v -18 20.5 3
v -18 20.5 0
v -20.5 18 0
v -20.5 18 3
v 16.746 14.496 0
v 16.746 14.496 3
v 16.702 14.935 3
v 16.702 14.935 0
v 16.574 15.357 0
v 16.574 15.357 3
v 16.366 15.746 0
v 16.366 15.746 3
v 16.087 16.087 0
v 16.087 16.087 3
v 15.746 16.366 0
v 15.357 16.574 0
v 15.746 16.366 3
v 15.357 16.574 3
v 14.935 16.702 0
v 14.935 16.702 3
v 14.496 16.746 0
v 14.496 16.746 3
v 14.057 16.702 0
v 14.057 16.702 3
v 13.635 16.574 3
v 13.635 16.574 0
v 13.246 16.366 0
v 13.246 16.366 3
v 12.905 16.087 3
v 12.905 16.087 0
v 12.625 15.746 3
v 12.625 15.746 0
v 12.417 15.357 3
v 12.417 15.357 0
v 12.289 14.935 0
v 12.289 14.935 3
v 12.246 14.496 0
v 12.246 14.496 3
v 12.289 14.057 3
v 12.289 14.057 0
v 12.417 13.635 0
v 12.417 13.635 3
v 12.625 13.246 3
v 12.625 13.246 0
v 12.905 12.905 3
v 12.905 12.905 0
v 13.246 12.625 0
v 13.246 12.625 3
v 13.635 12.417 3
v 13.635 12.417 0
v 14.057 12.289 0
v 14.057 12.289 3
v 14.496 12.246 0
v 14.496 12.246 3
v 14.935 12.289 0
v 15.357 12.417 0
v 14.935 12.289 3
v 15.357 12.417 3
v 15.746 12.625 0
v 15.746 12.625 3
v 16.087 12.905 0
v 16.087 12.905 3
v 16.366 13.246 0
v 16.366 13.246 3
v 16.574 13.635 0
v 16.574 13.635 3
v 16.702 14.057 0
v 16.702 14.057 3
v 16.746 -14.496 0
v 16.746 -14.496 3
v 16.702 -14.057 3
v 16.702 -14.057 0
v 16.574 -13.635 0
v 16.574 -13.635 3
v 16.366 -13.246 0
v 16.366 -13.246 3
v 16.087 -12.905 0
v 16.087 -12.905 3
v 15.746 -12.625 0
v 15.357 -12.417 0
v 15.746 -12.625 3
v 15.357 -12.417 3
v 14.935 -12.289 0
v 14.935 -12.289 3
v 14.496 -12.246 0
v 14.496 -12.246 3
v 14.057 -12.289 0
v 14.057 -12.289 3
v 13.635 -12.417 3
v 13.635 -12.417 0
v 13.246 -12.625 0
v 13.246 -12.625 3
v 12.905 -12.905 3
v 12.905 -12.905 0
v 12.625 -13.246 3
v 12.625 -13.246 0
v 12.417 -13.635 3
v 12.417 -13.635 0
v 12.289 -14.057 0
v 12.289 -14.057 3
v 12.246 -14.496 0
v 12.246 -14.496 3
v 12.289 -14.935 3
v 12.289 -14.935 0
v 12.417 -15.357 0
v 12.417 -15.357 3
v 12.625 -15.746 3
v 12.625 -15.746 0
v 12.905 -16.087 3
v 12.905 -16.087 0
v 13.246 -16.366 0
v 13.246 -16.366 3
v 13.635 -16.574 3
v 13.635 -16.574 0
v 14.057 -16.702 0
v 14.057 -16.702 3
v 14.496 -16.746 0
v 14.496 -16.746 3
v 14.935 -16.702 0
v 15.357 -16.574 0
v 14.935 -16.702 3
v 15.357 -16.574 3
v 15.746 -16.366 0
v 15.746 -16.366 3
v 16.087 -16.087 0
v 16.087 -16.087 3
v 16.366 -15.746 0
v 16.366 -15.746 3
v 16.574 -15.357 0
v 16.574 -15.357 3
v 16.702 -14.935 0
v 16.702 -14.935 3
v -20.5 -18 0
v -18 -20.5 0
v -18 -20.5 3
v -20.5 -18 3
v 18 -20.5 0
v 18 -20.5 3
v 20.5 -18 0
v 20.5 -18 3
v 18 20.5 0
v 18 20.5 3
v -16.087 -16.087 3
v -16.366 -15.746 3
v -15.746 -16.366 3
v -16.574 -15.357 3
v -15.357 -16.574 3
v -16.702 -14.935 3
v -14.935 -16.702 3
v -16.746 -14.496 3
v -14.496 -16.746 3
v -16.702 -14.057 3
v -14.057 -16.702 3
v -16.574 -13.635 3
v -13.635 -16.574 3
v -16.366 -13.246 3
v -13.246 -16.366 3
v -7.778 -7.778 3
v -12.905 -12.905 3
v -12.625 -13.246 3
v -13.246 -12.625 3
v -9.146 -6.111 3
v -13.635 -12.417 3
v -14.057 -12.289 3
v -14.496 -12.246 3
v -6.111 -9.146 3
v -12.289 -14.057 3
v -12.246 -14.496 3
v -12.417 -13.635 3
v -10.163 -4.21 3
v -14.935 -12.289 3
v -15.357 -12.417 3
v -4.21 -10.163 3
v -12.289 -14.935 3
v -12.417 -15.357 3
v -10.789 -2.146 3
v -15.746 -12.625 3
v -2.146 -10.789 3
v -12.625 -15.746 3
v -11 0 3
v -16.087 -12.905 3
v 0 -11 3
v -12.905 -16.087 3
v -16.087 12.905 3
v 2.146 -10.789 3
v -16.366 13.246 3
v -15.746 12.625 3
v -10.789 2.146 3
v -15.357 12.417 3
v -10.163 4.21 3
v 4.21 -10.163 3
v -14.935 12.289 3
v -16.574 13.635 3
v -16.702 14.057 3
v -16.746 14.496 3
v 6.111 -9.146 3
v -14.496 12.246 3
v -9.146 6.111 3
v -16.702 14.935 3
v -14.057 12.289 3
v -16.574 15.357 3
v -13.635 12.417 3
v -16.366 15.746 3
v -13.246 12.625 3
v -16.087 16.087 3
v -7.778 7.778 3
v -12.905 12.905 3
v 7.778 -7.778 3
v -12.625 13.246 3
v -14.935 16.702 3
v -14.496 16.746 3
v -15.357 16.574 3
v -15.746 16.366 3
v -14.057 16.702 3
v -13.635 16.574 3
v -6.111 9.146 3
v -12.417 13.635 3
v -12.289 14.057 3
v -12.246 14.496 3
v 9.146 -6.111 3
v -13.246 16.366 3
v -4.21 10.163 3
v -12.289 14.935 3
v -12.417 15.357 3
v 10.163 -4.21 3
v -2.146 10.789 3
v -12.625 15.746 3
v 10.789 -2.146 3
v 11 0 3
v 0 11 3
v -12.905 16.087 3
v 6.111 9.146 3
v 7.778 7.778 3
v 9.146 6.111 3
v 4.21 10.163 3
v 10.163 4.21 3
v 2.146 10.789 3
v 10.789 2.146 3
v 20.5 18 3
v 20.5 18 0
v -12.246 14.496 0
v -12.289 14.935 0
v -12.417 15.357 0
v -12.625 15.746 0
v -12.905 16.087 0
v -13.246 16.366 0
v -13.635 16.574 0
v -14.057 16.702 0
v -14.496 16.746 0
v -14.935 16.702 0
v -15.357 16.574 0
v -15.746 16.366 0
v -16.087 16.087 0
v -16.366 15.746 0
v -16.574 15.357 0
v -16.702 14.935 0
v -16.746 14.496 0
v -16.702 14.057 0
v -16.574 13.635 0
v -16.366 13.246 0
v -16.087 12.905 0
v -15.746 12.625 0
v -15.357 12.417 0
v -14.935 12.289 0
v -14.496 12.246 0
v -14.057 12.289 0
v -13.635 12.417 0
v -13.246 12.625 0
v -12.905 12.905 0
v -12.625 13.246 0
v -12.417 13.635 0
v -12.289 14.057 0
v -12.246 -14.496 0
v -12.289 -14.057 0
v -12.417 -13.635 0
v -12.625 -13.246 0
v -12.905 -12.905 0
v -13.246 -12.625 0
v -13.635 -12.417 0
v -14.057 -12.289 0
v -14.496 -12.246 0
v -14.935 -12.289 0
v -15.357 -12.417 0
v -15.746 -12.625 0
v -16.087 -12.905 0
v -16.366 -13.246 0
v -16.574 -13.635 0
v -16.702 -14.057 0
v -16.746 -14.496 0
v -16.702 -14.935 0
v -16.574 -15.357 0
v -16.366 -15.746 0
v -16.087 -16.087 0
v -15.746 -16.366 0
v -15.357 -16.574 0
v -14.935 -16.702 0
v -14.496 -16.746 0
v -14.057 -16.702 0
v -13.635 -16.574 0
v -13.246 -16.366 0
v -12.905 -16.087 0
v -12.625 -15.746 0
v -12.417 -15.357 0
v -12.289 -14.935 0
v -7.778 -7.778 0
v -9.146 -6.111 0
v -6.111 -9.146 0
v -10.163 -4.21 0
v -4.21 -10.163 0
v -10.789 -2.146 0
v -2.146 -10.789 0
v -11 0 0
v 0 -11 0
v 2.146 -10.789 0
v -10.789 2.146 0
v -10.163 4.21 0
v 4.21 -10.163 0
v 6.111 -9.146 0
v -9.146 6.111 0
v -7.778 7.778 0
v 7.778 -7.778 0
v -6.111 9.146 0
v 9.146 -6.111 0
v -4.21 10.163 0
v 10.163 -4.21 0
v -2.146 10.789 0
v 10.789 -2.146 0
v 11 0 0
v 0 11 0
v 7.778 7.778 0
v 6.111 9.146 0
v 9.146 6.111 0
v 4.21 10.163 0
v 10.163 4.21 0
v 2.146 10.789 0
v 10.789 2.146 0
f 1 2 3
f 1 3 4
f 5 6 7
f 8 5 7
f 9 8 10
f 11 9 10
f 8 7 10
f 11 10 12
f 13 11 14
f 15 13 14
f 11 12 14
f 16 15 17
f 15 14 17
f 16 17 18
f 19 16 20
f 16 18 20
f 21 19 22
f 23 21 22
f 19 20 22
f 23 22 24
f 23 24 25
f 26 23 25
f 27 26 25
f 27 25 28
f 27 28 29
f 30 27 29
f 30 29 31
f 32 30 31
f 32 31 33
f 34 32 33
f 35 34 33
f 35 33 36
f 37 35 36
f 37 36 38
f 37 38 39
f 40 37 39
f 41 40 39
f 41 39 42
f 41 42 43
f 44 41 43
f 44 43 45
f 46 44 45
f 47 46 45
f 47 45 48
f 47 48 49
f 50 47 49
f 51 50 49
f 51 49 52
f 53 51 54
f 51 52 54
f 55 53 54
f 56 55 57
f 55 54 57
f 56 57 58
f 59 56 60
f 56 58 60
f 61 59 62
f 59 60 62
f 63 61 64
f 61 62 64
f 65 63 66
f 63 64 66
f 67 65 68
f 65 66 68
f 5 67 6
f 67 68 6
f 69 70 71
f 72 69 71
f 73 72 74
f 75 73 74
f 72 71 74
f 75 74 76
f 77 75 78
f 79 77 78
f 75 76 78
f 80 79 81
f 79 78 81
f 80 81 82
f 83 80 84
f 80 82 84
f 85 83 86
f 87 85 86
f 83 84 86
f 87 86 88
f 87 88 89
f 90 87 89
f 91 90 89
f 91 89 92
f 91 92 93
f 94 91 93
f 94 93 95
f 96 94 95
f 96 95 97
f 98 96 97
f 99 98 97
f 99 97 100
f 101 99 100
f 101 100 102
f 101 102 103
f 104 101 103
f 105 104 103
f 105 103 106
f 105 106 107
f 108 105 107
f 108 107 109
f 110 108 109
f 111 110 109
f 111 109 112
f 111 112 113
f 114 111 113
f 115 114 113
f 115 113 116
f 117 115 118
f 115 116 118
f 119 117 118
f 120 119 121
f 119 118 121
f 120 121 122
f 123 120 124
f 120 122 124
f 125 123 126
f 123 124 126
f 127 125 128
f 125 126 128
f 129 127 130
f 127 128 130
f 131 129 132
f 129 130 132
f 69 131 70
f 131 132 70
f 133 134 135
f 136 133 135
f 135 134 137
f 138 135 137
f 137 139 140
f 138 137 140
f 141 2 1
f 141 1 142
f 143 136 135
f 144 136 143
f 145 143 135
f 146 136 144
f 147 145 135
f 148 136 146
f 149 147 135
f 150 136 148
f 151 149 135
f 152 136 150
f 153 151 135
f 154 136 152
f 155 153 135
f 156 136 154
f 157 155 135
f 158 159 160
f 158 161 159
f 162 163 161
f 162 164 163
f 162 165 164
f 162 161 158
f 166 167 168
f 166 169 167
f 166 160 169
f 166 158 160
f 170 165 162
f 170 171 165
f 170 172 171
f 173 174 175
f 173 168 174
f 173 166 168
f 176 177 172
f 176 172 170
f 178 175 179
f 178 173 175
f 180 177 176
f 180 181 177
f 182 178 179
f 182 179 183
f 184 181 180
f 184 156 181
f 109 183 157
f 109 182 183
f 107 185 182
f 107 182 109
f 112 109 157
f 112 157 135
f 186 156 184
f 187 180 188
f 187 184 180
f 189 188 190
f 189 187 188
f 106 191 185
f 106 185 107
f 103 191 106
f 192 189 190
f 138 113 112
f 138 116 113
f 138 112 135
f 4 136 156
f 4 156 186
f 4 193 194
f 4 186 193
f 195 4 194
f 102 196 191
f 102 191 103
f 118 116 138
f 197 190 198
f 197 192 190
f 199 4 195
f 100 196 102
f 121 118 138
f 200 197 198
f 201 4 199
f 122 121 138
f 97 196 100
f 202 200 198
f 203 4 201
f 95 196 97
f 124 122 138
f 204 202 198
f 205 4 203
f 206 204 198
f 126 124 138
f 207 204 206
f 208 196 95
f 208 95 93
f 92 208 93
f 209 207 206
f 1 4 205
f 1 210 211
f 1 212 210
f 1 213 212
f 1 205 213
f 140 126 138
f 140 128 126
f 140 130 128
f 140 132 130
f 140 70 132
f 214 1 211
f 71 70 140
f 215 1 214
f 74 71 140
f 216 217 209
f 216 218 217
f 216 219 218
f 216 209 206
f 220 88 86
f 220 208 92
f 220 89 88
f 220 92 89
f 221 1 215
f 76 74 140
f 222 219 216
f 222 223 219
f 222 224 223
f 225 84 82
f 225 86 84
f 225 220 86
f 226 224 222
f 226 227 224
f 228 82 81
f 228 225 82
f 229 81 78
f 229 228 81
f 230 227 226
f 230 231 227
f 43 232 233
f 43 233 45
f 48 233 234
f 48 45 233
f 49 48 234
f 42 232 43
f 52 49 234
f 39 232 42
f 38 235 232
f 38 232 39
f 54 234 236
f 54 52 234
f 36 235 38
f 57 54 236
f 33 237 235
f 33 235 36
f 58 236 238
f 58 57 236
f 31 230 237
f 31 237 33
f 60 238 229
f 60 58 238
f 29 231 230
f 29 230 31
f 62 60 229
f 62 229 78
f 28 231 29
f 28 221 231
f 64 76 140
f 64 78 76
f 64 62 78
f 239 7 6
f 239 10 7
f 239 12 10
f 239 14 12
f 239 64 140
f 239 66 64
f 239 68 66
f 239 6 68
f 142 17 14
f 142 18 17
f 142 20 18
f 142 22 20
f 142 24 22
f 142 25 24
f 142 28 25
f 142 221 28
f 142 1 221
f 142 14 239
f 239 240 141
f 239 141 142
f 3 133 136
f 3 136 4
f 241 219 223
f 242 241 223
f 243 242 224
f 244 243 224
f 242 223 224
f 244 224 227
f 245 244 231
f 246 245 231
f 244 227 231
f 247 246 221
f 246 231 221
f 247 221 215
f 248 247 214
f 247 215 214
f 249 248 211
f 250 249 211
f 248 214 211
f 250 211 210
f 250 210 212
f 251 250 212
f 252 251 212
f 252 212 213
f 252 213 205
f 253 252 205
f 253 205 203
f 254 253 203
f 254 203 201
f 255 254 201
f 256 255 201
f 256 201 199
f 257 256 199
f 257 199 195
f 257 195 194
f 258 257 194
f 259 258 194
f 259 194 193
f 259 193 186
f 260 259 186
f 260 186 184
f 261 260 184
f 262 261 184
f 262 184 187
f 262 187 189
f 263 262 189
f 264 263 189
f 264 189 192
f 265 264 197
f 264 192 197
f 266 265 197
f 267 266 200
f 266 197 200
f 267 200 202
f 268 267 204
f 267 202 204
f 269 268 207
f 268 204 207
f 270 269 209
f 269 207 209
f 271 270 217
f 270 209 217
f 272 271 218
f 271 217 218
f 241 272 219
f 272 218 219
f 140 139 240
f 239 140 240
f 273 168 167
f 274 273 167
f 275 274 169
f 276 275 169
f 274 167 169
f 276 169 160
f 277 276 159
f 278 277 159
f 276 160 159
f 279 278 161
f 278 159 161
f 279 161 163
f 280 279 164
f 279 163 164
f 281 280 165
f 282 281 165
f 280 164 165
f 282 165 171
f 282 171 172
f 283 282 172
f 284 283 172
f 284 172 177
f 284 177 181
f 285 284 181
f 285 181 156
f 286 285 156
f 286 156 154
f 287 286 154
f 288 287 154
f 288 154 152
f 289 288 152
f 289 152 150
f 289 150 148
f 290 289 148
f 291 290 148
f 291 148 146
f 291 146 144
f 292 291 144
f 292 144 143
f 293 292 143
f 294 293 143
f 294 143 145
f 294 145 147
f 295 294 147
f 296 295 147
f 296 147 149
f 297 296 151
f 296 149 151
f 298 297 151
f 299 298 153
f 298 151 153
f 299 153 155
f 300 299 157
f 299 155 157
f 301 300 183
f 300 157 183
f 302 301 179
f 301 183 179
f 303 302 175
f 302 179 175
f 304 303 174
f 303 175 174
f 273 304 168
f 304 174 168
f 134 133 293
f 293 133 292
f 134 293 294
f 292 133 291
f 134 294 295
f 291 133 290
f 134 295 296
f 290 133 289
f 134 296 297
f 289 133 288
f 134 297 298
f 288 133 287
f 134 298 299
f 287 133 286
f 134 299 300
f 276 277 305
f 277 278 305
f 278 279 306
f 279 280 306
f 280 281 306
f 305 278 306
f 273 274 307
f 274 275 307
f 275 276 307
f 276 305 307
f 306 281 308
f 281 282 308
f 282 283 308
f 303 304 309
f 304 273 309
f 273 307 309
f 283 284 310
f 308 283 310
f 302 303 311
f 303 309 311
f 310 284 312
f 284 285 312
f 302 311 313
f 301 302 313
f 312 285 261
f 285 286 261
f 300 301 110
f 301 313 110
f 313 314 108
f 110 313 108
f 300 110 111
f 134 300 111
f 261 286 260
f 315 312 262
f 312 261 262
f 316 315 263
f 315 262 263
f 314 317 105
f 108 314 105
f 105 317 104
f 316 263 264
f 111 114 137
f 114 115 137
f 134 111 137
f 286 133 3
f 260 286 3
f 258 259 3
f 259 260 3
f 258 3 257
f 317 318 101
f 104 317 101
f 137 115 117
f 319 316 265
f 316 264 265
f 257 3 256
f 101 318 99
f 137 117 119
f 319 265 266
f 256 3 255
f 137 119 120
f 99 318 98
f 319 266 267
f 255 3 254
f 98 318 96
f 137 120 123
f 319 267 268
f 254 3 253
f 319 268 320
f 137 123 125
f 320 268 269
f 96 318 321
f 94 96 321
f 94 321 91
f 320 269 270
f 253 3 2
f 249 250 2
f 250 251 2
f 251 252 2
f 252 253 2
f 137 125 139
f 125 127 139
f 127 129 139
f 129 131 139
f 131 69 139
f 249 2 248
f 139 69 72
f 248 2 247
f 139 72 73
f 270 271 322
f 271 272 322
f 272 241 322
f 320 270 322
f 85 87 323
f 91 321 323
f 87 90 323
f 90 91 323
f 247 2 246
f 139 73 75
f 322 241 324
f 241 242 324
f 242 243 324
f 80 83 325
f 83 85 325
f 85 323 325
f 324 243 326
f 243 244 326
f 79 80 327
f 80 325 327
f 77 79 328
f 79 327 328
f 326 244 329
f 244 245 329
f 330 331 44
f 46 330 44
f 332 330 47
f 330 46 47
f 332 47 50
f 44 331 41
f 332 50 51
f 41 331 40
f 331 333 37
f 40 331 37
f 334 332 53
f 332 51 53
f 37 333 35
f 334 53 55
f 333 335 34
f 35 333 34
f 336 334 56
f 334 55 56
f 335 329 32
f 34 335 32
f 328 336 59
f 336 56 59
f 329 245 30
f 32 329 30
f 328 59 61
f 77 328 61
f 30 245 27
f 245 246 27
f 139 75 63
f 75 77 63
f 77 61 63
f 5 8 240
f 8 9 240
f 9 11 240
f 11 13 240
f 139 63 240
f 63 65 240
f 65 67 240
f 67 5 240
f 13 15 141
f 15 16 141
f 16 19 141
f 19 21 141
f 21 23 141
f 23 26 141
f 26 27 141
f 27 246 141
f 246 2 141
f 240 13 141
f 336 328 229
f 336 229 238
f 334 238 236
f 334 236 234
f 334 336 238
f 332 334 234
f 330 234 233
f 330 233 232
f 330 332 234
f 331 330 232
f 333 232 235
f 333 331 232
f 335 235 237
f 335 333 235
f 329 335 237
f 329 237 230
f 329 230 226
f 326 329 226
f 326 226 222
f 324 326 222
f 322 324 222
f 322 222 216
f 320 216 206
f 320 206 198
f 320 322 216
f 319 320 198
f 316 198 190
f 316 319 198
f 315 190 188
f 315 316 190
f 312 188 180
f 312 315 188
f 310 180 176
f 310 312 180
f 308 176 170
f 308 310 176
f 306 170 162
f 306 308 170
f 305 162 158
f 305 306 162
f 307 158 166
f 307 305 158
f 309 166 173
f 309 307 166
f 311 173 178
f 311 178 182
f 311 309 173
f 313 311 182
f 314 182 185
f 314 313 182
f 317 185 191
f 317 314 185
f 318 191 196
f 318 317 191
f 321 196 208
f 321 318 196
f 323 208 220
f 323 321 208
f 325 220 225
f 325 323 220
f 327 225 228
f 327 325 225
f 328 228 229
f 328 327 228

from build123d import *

# Parameters (mm, degrees)
SKETCH_1_W          = 41
SKETCH_1_H          = 41
SKETCH_1_R          = 11
EXTRUDE_1_DEPTH     = 3
SKETCH_4_R          = 2.25
CUT_EXTRUDE_2_DEPTH = 4
CHAMFER_1_SIZE      = 2.5


with BuildPart() as part:
    # Эскиз1 → Вытянуть1 (new body)
    with BuildSketch(Plane.XY):
        Rectangle(SKETCH_1_W, SKETCH_1_H)
        Circle(SKETCH_1_R, mode=Mode.SUBTRACT)
    extrude(amount=EXTRUDE_1_DEPTH)

    # Эскиз4 → Вытянуть2 (cut, through all)
    with BuildSketch(Plane.XY.offset(3)):
        with Locations((-14.495689014, 14.495689014)):
            Circle(SKETCH_4_R)
        with Locations((14.495689014, 14.495689014)):
            Circle(SKETCH_4_R)
        with Locations((14.495689014, -14.495689014)):
            Circle(SKETCH_4_R)
        with Locations((-14.495689014, -14.495689014)):
            Circle(SKETCH_4_R)
    extrude(amount=-CUT_EXTRUDE_2_DEPTH, mode=Mode.SUBTRACT)

    # Фаска1
    chamfer_1_edges = [part.edges().sort_by_distance(p)[0] for p in [
        (20.5, -20.5, 1.5),
        (-20.5, -20.5, 1.5),
        (-20.5, 20.5, 1.5),
        (20.5, 20.5, 1.5),
    ]]
    chamfer(chamfer_1_edges, length=CHAMFER_1_SIZE)


solid = part.part
